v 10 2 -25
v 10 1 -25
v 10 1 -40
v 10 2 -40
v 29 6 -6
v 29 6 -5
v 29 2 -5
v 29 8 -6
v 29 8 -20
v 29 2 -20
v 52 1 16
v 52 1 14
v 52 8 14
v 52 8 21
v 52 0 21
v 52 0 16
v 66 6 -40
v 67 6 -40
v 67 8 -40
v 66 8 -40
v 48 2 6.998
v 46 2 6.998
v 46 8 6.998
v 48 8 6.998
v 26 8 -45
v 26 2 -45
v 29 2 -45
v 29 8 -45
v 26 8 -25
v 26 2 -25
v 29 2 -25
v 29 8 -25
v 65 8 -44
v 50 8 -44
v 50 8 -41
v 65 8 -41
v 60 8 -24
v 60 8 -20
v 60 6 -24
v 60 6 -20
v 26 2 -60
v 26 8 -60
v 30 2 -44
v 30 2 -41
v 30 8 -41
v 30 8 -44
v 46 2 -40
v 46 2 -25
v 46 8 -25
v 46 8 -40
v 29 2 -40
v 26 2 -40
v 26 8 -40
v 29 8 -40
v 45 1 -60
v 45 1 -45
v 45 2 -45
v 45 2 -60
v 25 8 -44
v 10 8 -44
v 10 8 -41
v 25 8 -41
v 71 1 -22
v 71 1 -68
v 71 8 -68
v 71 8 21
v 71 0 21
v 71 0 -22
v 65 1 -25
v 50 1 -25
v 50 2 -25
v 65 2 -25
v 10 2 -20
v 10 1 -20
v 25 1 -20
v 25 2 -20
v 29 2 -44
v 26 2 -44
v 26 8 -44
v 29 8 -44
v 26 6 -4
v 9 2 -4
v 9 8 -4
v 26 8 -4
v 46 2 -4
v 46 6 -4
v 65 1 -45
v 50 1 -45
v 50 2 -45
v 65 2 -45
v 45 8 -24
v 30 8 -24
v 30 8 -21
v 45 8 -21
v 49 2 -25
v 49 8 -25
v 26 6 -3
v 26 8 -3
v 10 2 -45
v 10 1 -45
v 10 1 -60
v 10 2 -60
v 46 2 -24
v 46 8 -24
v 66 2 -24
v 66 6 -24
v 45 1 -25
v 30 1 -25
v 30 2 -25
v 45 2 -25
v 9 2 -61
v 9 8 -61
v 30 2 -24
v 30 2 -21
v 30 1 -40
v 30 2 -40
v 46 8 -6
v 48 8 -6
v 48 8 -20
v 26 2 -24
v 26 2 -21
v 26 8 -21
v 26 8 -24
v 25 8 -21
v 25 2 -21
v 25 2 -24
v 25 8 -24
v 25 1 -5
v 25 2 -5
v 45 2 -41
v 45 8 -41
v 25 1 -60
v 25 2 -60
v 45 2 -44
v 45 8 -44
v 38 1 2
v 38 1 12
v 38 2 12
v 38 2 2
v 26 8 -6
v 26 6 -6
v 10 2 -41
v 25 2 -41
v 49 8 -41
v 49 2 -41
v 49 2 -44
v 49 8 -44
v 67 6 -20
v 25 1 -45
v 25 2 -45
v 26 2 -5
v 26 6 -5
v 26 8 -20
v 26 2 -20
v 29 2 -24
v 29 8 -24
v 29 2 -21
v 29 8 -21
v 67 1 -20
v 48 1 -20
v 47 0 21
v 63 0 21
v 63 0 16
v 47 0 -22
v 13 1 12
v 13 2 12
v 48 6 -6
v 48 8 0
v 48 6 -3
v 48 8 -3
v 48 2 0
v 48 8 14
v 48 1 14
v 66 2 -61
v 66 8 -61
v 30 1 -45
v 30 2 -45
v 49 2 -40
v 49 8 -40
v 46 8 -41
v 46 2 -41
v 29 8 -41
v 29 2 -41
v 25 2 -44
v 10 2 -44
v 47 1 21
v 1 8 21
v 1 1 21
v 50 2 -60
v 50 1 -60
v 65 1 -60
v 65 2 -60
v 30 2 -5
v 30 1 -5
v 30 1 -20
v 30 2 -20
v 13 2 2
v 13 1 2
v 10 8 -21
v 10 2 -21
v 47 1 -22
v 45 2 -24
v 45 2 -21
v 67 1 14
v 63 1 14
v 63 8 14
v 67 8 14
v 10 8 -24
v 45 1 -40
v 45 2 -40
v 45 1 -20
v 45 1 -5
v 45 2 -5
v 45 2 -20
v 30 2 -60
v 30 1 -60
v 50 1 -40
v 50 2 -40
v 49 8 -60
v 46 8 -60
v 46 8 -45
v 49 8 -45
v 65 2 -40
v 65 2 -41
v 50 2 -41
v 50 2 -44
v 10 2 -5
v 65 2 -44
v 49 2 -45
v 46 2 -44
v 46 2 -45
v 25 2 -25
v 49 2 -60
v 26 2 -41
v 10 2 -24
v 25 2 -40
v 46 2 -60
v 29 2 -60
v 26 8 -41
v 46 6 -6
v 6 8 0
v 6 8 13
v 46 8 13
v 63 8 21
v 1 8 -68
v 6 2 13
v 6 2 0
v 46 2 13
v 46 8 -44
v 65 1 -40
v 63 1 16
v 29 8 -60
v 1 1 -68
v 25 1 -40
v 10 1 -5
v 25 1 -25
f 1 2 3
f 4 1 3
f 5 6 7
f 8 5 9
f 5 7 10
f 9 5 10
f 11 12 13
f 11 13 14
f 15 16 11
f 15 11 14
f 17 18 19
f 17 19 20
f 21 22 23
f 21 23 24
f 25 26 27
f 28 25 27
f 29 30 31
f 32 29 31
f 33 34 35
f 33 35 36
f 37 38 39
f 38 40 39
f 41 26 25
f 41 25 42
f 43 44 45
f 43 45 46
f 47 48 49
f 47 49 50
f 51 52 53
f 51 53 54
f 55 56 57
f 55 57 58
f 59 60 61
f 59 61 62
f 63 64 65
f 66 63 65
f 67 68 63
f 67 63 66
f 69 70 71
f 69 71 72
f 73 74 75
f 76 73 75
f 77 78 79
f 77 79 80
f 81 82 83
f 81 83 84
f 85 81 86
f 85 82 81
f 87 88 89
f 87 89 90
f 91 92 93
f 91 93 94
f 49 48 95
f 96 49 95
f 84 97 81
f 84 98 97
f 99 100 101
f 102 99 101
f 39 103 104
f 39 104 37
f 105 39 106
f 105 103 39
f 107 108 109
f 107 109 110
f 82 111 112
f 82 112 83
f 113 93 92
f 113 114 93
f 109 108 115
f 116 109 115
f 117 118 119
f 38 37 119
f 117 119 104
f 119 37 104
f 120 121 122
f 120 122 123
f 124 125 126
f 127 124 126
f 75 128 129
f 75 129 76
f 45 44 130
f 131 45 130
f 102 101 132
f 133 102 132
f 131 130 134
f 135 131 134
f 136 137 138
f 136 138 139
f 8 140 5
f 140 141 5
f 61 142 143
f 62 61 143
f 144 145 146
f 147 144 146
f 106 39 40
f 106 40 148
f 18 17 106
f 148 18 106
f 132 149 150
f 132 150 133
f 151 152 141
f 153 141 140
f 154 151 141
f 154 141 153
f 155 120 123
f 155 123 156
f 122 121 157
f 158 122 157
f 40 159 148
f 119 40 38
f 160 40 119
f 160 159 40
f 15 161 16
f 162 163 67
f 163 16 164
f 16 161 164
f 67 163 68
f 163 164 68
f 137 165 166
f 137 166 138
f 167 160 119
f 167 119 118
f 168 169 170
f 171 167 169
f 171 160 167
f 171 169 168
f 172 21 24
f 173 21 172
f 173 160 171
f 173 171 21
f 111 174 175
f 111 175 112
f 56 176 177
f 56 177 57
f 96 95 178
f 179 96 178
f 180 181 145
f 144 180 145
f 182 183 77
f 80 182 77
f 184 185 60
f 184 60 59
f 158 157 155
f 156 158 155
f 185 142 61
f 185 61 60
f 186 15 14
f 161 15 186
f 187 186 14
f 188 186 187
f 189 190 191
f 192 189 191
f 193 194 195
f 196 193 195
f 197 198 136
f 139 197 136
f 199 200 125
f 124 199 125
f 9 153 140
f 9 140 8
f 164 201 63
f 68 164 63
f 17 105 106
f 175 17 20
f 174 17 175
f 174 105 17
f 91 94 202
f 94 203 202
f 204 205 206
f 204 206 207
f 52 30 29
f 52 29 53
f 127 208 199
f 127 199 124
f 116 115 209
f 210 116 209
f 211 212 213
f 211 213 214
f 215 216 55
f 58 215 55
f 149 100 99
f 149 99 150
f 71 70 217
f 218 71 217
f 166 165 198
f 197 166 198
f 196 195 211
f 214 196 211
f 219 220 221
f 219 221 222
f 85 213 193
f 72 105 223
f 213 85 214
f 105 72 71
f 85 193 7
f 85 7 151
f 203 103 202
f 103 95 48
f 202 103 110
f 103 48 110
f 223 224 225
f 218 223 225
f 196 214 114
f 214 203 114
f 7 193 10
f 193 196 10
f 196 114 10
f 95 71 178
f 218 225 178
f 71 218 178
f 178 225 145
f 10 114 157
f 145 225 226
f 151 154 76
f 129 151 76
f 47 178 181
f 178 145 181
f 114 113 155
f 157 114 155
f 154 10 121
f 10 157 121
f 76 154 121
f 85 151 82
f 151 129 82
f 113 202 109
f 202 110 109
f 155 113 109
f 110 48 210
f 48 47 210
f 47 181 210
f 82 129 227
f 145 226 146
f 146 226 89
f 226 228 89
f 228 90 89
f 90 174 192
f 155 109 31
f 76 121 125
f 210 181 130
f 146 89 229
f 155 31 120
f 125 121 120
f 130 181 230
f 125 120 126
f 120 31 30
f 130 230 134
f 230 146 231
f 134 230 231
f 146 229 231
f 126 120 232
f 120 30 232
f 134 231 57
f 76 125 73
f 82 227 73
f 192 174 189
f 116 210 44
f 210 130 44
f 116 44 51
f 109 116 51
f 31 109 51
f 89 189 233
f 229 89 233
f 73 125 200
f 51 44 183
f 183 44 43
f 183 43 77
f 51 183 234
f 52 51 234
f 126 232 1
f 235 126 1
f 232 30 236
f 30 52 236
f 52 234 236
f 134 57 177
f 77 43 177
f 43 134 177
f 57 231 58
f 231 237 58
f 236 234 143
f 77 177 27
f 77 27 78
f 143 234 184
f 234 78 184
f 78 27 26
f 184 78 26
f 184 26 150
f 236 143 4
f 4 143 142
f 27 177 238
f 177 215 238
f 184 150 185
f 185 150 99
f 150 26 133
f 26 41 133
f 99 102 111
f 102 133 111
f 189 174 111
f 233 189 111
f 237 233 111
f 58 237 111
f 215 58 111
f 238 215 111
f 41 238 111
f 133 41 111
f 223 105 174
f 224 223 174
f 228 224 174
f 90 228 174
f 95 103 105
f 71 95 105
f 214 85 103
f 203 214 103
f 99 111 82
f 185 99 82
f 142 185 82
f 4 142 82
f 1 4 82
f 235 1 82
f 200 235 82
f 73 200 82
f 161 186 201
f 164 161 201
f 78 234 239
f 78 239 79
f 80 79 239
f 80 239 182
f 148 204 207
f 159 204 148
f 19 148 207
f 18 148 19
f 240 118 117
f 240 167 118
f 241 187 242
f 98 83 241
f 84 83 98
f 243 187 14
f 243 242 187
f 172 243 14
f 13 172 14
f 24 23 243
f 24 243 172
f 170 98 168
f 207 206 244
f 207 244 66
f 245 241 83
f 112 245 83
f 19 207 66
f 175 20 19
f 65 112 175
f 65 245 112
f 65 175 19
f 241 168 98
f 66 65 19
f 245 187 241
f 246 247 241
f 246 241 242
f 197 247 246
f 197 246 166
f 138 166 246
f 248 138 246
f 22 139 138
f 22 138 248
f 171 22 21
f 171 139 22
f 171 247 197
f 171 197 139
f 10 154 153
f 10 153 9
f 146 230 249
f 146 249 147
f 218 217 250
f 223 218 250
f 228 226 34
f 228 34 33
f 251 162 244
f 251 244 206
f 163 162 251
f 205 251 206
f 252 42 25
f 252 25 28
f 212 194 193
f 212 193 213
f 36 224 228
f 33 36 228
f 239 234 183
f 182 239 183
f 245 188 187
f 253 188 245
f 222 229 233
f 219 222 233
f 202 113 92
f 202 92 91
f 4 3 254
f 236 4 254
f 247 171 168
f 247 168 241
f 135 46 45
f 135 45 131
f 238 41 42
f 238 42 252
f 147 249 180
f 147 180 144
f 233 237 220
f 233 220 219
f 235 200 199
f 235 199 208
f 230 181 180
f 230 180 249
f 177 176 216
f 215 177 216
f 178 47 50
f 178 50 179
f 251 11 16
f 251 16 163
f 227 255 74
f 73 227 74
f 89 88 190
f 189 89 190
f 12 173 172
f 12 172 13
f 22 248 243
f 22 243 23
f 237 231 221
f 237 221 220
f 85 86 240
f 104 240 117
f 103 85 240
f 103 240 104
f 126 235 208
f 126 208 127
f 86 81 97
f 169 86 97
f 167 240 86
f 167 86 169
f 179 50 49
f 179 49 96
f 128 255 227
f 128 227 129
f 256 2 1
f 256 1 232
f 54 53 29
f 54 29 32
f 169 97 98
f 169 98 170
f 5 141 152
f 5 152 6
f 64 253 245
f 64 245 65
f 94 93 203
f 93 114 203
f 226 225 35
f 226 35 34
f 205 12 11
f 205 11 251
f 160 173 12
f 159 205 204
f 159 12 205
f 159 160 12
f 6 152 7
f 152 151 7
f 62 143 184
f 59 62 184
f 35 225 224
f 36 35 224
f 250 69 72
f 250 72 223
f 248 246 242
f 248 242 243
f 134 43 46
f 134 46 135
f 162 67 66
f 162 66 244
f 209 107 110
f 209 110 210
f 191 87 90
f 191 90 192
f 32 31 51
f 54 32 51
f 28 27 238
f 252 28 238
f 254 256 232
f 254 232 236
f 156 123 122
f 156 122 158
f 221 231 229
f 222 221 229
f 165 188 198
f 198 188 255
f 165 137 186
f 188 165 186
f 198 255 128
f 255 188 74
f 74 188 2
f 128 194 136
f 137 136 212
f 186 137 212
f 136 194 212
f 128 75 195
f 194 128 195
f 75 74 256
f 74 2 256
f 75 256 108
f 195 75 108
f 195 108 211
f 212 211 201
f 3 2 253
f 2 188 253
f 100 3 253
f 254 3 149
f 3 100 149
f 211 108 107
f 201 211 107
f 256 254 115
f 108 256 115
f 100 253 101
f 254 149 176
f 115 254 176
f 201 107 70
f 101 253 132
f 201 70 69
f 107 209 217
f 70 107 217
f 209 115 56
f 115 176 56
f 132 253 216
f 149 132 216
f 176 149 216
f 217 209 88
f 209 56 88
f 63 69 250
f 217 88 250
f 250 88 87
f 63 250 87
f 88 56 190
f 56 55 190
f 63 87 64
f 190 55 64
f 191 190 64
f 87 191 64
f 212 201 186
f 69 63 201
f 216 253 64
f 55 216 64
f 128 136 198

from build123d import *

# Parameters (mm, degrees)
SKETCH_1_W                = 71
SKETCH_1_H                = 67
EXTRUDE_2_DEPTH           = 5
SKETCH_1_2_W              = 71
SKETCH_1_2_H              = 67
EXTRUDE_3_DEPTH           = 7
SKETCH_9_W                = 20
SKETCH_9_H                = 20
CUT_EXTRUDE_5_DEPTH       = 36
SKETCH_10_W               = 15
SKETCH_10_H               = 15
SKETCH_10_W_2             = 1
SKETCH_10_H_2             = 20
CUT_EXTRUDE_6_DEPTH       = 32
SKETCH_14_W               = 1
SKETCH_14_H               = 37
SKETCH_14_H_2             = 57
CUT_EXTRUDE_7_DEPTH       = 19
SKETCH_15_W               = 37
SKETCH_15_H               = 1
SKETCH_15_W_2             = 57
CUT_EXTRUDE_8_DEPTH       = 27
SKETCH_16_W               = 23
SKETCH_16_H               = 21
CUT_EXTRUDE_9_DEPTH       = 17
SKETCH_17_W               = 1
SKETCH_17_H               = 67
CUT_EXTRUDE_10_DEPTH      = 27
SKETCH_18_W               = 1
SKETCH_18_H               = 19
CUT_EXTRUDE_11_DEPTH      = 1
SKETCH_19_W               = 2
SKETCH_19_H               = 19
CUT_EXTRUDE_12_DEPTH      = 1
SKETCH_20_W               = 1
SKETCH_20_H               = 3
CUT_EXTRUDE_13_DEPTH      = 1
SKETCH_21_W               = 2
SKETCH_21_H               = 1
CUT_EXTRUDE_15_DEPTH      = 1
SKETCH_22_W               = 23
SKETCH_22_H               = 1
EXTRUDE_4_DEPTH           = 7
SKETCH_23_W               = 1
SKETCH_23_H               = 1
SKETCH_23_W_2             = 2
CUT_EXTRUDE_16_DEPTH      = 1
SKETCH_24_W               = 70
SKETCH_24_H               = 1
EXTRUDE_5_DEPTH           = 7
SKETCH_27_W               = 5
SKETCH_27_H               = 20
EXTRUDE_6_DEPTH           = 7
SKETCH_28_W               = 42
SKETCH_28_H               = 8
EXTRUDE_7_DEPTH           = 7
SKETCH_29_W               = 42
SKETCH_29_H               = 1
CUT_EXTRUDE_17_DEPTH      = 7
SKETCH_30_W               = 47
SKETCH_30_H               = 1
EXTRUDE_8_DEPTH           = 7
SKETCH_31_W               = 2
SKETCH_31_H               = 3
EXTRUDE_9_DEPTH           = 7
SKETCH_32_W               = 4
SKETCH_32_H               = 41
EXTRUDE_11_DEPTH          = 7
SKETCH_33_W               = 4
SKETCH_33_H               = 4
EXTRUDE_12_DEPTH          = 7
SKETCH_34_W               = 4
SKETCH_34_H               = 4
EXTRUDE_13_DEPTH          = 7
SKETCH_35_W               = 19
SKETCH_35_H               = 3
EXTRUDE_14_DEPTH          = 7
SKETCH_36_W               = 11
SKETCH_36_H               = 3
CUT_EXTRUDE_20_DEPTH      = 7
SKETCH_37_R               = 0.5
CUT_EXTRUDE_22_DEPTH      = 9
SKETCH_38_R               = 1
CUT_EXTRUDE_23_DEPTH      = 5
EXTRUDE_15_DEPTH          = 1
SKETCH_37_3_R             = 0.5
CUT_EXTRUDE_26_DEPTH      = 12
CUT_EXTRUDE_26_DEPTH_BACK = 12
SKETCH_40_W               = 2
SKETCH_40_H               = 1
CUT_EXTRUDE_28_DEPTH      = 9
CUT_EXTRUDE_28_DEPTH_BACK = 1
SKETCH_42_W               = 3
SKETCH_42_H               = 4
CUT_EXTRUDE_29_DEPTH      = 1
SKETCH_43_W               = 3
SKETCH_43_H               = 15
SKETCH_43_W_2             = 15
SKETCH_43_H_2             = 3
EXTRUDE_17_DEPTH          = 1
SKETCH_44_W               = 2
SKETCH_44_H               = 3.001760435
EXTRUDE_18_DEPTH          = 8
SKETCH_45_W               = 7
SKETCH_45_H               = 13
EXTRUDE_19_DEPTH          = 1
SKETCH_46_W               = 10
SKETCH_46_H               = 13
EXTRUDE_20_DEPTH          = 1
SKETCH_49_W               = 22.379206011
SKETCH_49_H               = 34.512992384
EXTRUDE_26_DEPTH          = 1
SKETCH_50_W               = 4.314622461
SKETCH_50_H               = 5.170850193
SKETCH_50_W_2             = 4.148439206
SKETCH_50_H_2             = 6.322894144
SKETCH_50_W_3             = 5.848573563
EXTRUDE_27_DEPTH          = 8
SKETCH_51_W               = 4
SKETCH_51_H               = 18
SKETCH_51_W_2             = 1
EXTRUDE_28_DEPTH          = 1
SKETCH_52_W               = 11
SKETCH_52_H               = 2
EXTRUDE_29_DEPTH          = 1
EXTRUDE_30_DEPTH          = 1
SKETCH_55_W               = 15
SKETCH_55_H               = 15
CUT_EXTRUDE_31_DEPTH      = 1
CUT_EXTRUDE_32_DEPTH      = 1
SKETCH_57_W               = 46
SKETCH_57_H               = 23
CUT_EXTRUDE_33_DEPTH      = 1
SKETCH_58_W               = 15
SKETCH_58_H               = 3
EXTRUDE_31_DEPTH          = 1
SKETCH_59_W               = 22
SKETCH_59_H               = 1
CUT_EXTRUDE_37_DEPTH      = 2
CUT_EXTRUDE_37_DEPTH_BACK = 1
SKETCH_60_W               = 25
SKETCH_60_H               = 2
SKETCH_60_H_2             = 1
EXTRUDE_32_DEPTH          = 1
SKETCH_61_W               = 2
SKETCH_61_H               = 4
CUT_EXTRUDE_39_DEPTH      = 1
CUT_EXTRUDE_39_DEPTH_BACK = 1
SKETCH_62_W               = 3
SKETCH_62_H               = 1
CUT_EXTRUDE_40_DEPTH      = 1
CUT_EXTRUDE_40_DEPTH_BACK = 1


with BuildPart() as part:
    # 草图1 → 凸台-拉伸2 (new body)
    with BuildSketch(Plane(origin=(0, 0, 0), x_dir=(1, 0, 0), z_dir=(0, 1, 0))):
        with Locations((35.5, 33.5)):
            Rectangle(SKETCH_1_W, SKETCH_1_H)
    extrude(amount=EXTRUDE_2_DEPTH)

    # 草图1<2> → 凸台-拉伸3 (add)
    with BuildSketch(Plane(origin=(0, 0, 0), x_dir=(1, 0, 0), z_dir=(0, 1, 0))):
        with Locations((35.5, 33.5)):
            Rectangle(SKETCH_1_2_W, SKETCH_1_2_H)
    extrude(amount=EXTRUDE_3_DEPTH)

    # 草图9 → 切除-拉伸5 (cut)
    with BuildSketch(Plane(origin=(0, 0, 0), x_dir=(1, 0, 0), z_dir=(0, 1, 0))):
        with Locations((61, 10)):
            Rectangle(SKETCH_9_W, SKETCH_9_H)
    extrude(amount=CUT_EXTRUDE_5_DEPTH, mode=Mode.SUBTRACT)

    # 草图10 → 切除-拉伸6 (cut)
    with BuildSketch(Plane(origin=(0, 0, 0), x_dir=(1, 0, 0), z_dir=(0, 1, 0))):
        with Locations((17.5, 52.5)):
            Rectangle(SKETCH_10_W, SKETCH_10_H)
        with Locations((37.5, 52.5)):
            Rectangle(SKETCH_10_W, SKETCH_10_H)
        with Locations((57.5, 52.5)):
            Rectangle(SKETCH_10_W, SKETCH_10_H)
        with Locations((57.5, 32.5)):
            Rectangle(SKETCH_10_W, SKETCH_10_H)
        with Locations((37.5, 32.5)):
            Rectangle(SKETCH_10_W, SKETCH_10_H)
        with Locations((17.5, 32.5)):
            Rectangle(SKETCH_10_W, SKETCH_10_H)
        with Locations((17.5, 12.5)):
            Rectangle(SKETCH_10_W, SKETCH_10_H)
        with Locations((37.5, 12.5)):
            Rectangle(SKETCH_10_W, SKETCH_10_H)
        with Locations((50.5, 10)):
            Rectangle(SKETCH_10_W_2, SKETCH_10_H_2)
    extrude(amount=CUT_EXTRUDE_6_DEPTH, mode=Mode.SUBTRACT)

    # 草图14 → 切除-拉伸7 (cut)
    with BuildSketch(Plane(origin=(0, 1, 0), x_dir=(1, 0, 0), z_dir=(0, 1, 0))):
        with Locations((65.5, 42.5)):
            Rectangle(SKETCH_14_W, SKETCH_14_H)
        with Locations((49.5, 42.5)):
            Rectangle(SKETCH_14_W, SKETCH_14_H)
        with Locations((29.5, 32.5)):
            Rectangle(SKETCH_14_W, SKETCH_14_H_2)
        with Locations((25.5, 32.5)):
            Rectangle(SKETCH_14_W, SKETCH_14_H_2)
        with Locations((9.5, 32.5)):
            Rectangle(SKETCH_14_W, SKETCH_14_H_2)
        with Locations((45.5, 32.5)):
            Rectangle(SKETCH_14_W, SKETCH_14_H_2)
    extrude(amount=CUT_EXTRUDE_7_DEPTH, mode=Mode.SUBTRACT)

    # 草图15 → 切除-拉伸8 (cut)
    with BuildSketch(Plane(origin=(0, 1, 0), x_dir=(1, 0, 0), z_dir=(0, 1, 0))):
        with Locations((27.5, 4.5)):
            Rectangle(SKETCH_15_W, SKETCH_15_H)
        with Locations((37.5, 24.5)):
            Rectangle(SKETCH_15_W_2, SKETCH_15_H)
        with Locations((37.5, 44.5)):
            Rectangle(SKETCH_15_W_2, SKETCH_15_H)
        with Locations((27.5, 20.5)):
            Rectangle(SKETCH_15_W, SKETCH_15_H)
        with Locations((37.5, 40.5)):
            Rectangle(SKETCH_15_W_2, SKETCH_15_H)
        with Locations((37.5, 60.5)):
            Rectangle(SKETCH_15_W_2, SKETCH_15_H)
    extrude(amount=CUT_EXTRUDE_8_DEPTH, mode=Mode.SUBTRACT)

    # 草图16 → 切除-拉伸9 (cut)
    with BuildSketch(Plane(origin=(0, 0, 0), x_dir=(1, 0, 0), z_dir=(0, 1, 0))):
        with Locations((59.5, 10.5)):
            Rectangle(SKETCH_16_W, SKETCH_16_H)
    extrude(amount=CUT_EXTRUDE_9_DEPTH, mode=Mode.SUBTRACT)

    # 草图17 → 切除-拉伸10 (cut)
    with BuildSketch(Plane(origin=(0, 0, 0), x_dir=(1, 0, 0), z_dir=(0, 1, 0))):
        with Locations((0.5, 33.5)):
            Rectangle(SKETCH_17_W, SKETCH_17_H)
    extrude(amount=CUT_EXTRUDE_10_DEPTH, mode=Mode.SUBTRACT)

    # 草图18 → 切除-拉伸11 (cut)
    with BuildSketch(Plane(origin=(0, 7, 0), x_dir=(1, 0, 0), z_dir=(0, 1, 0))):
        with Locations((66.5, 30.5)):
            Rectangle(SKETCH_18_W, SKETCH_18_H)
    extrude(amount=-CUT_EXTRUDE_11_DEPTH, mode=Mode.SUBTRACT)

    # 草图19 → 切除-拉伸12 (cut)
    with BuildSketch(Plane(origin=(0, 7, 0), x_dir=(1, 0, 0), z_dir=(0, 1, 0))):
        with Locations((66, 30.5)):
            Rectangle(SKETCH_19_W, SKETCH_19_H)
    extrude(amount=-CUT_EXTRUDE_12_DEPTH, mode=Mode.SUBTRACT)

    # 草图20 → 切除-拉伸13 (cut)
    with BuildSketch(Plane(origin=(0, 7, 0), x_dir=(1, 0, 0), z_dir=(0, 1, 0))):
        with Locations((63.5, 22.5)):
            Rectangle(SKETCH_20_W, SKETCH_20_H)
    extrude(amount=-CUT_EXTRUDE_13_DEPTH, mode=Mode.SUBTRACT)

    # 草图21 → 切除-拉伸15 (cut)
    with BuildSketch(Plane(origin=(0, 7, 0), x_dir=(1, 0, 0), z_dir=(0, 1, 0))):
        with Locations((47, 5.5)):
            Rectangle(SKETCH_21_W, SKETCH_21_H)
    extrude(amount=-CUT_EXTRUDE_15_DEPTH, mode=Mode.SUBTRACT)

    # 草图22 → 凸台-拉伸4 (add)
    with BuildSketch(Plane(origin=(0, 7, 0), x_dir=(1, 0, 0), z_dir=(0, 1, 0))):
        with Locations((59.5, 20.5)):
            Rectangle(SKETCH_22_W, SKETCH_22_H)
    extrude(amount=-EXTRUDE_4_DEPTH)

    # 草图23 → 切除-拉伸16 (cut)
    with BuildSketch(Plane(origin=(0, 7, 0), x_dir=(1, 0, 0), z_dir=(0, 1, 0))):
        with Locations((63.5, 20.5)):
            Rectangle(SKETCH_23_W, SKETCH_23_H)
        with Locations((66, 20.5)):
            Rectangle(SKETCH_23_W_2, SKETCH_23_H)
    extrude(amount=-CUT_EXTRUDE_16_DEPTH, mode=Mode.SUBTRACT)

    # 草图24 → 凸台-拉伸5 (add)
    with BuildSketch(Plane(origin=(0, 7, 0), x_dir=(1, 0, 0), z_dir=(0, 1, 0))):
        with Locations((36, 67.5)):
            Rectangle(SKETCH_24_W, SKETCH_24_H)
    extrude(amount=-EXTRUDE_5_DEPTH)

    # 草图27 → 凸台-拉伸6 (add)
    with BuildSketch(Plane(origin=(0, 7, 0), x_dir=(1, 0, 0), z_dir=(0, 1, 0))):
        with Locations((3.5, -10)):
            Rectangle(SKETCH_27_W, SKETCH_27_H)
    extrude(amount=-EXTRUDE_6_DEPTH)

    # 草图28 → 凸台-拉伸7 (add)
    with BuildSketch(Plane(origin=(0, 7, 0), x_dir=(1, 0, 0), z_dir=(0, 1, 0))):
        with Locations((27, -16)):
            Rectangle(SKETCH_28_W, SKETCH_28_H)
    extrude(amount=-EXTRUDE_7_DEPTH)

    # 草图29 → 切除-拉伸17 (cut)
    with BuildSketch(Plane(origin=(0, 7, 0), x_dir=(1, 0, 0), z_dir=(0, 1, 0))):
        with Locations((27, -12.5)):
            Rectangle(SKETCH_29_W, SKETCH_29_H)
    extrude(amount=-CUT_EXTRUDE_17_DEPTH, mode=Mode.SUBTRACT)

    # 草图30 → 凸台-拉伸8 (add)
    with BuildSketch(Plane(origin=(0, 7, 0), x_dir=(1, 0, 0), z_dir=(0, 1, 0))):
        with Locations((24.5, -20.5)):
            Rectangle(SKETCH_30_W, SKETCH_30_H)
    extrude(amount=-EXTRUDE_8_DEPTH)

    # 草图31 → 凸台-拉伸9 (add)
    with BuildSketch(Plane(origin=(0, 7, 0), x_dir=(1, 0, 0), z_dir=(0, 1, 0))):
        with Locations((47, -11.5)):
            Rectangle(SKETCH_31_W, SKETCH_31_H)
    extrude(amount=-EXTRUDE_9_DEPTH)

    # 草图32 → 凸台-拉伸11 (add)
    with BuildSketch(Plane(origin=(0, 7, 0), x_dir=(1, 0, 0), z_dir=(0, 1, 0))):
        with Locations((69, -0.5)):
            Rectangle(SKETCH_32_W, SKETCH_32_H)
    extrude(amount=-EXTRUDE_11_DEPTH)

    # 草图33 → 凸台-拉伸12 (add)
    with BuildSketch(Plane(origin=(0, 7, 0), x_dir=(1, 0, 0), z_dir=(0, 1, 0))):
        with Locations((65, -19)):
            Rectangle(SKETCH_33_W, SKETCH_33_H)
    extrude(amount=-EXTRUDE_12_DEPTH)

    # 草图34 → 凸台-拉伸13 (add)
    with BuildSketch(Plane(origin=(0, 7, 0), x_dir=(1, 0, 0), z_dir=(0, 1, 0))):
        with Locations((50, -19)):
            Rectangle(SKETCH_34_W, SKETCH_34_H)
    extrude(amount=-EXTRUDE_13_DEPTH)

    # 草图35 → 凸台-拉伸14 (add)
    with BuildSketch(Plane(origin=(0, 7, 0), x_dir=(1, 0, 0), z_dir=(0, 1, 0))):
        with Locations((57.5, -15.5)):
            Rectangle(SKETCH_35_W, SKETCH_35_H)
    extrude(amount=-EXTRUDE_14_DEPTH)

    # 草图36 → 切除-拉伸20 (cut)
    with BuildSketch(Plane(origin=(0, 0, 0), x_dir=(1, 0, 0), z_dir=(0, 1, 0))):
        with Locations((57.5, -15.5)):
            Rectangle(SKETCH_36_W, SKETCH_36_H)
    extrude(amount=CUT_EXTRUDE_20_DEPTH, mode=Mode.SUBTRACT)

    # 草图37 → 切除-拉伸22 (cut)
    with BuildSketch(Plane(origin=(0, 7, 0), x_dir=(1, 0, 0), z_dir=(0, 1, 0))):
        with Locations((3, -18)):
            Circle(SKETCH_37_R)
        with Locations((69.5, -18)):
            Circle(SKETCH_37_R)
        with Locations((69.5, 64)):
            Circle(SKETCH_37_R)
        with Locations((3.5, 64)):
            Circle(SKETCH_37_R)
    extrude(amount=-CUT_EXTRUDE_22_DEPTH, mode=Mode.SUBTRACT)

    # 草图38 → 切除-拉伸23 (cut)
    with BuildSketch(Plane(origin=(0, 0, 0), x_dir=(1, 0, 0), z_dir=(0, 1, 0))):
        with Locations((69.5, -18)):
            Circle(SKETCH_38_R)
        with Locations((69.5, 64)):
            Circle(SKETCH_38_R)
        with Locations((3.5, 64)):
            Circle(SKETCH_38_R)
        with Locations((3, -18)):
            Circle(SKETCH_38_R)
    extrude(amount=CUT_EXTRUDE_23_DEPTH, mode=Mode.SUBTRACT)

    # 草图39 → 凸台-拉伸15 (add)
    with BuildSketch(Plane(origin=(0, 7, 0), x_dir=(1, 0, 0), z_dir=(0, 1, 0))):
        Polygon((1, 68), (71, 68), (71, -21), (63, -21), (63, -14), (67, -14), (67, 40), (66, 40), (66, 61), (9, 61), (9, 4), (46, 4), (46, 5), (48, 5), (48, 0), (6, 0), (6, -13), (46, -13), (46, -10), (48, -10), (48, -14), (52, -14), (52, -21), (1, -21), align=None)
    extrude(amount=EXTRUDE_15_DEPTH)

    # 草图37<3> → 切除-拉伸26 (cut, two sides)
    with BuildSketch(Plane(origin=(0, 7, 0), x_dir=(1, 0, 0), z_dir=(0, 1, 0))) as cut_extrude_26_sk:
        with Locations((3, -18)):
            Circle(SKETCH_37_3_R)
        with Locations((69.5, -18)):
            Circle(SKETCH_37_3_R)
        with Locations((69.5, 64)):
            Circle(SKETCH_37_3_R)
        with Locations((3.5, 64)):
            Circle(SKETCH_37_3_R)
    extrude(amount=CUT_EXTRUDE_26_DEPTH, mode=Mode.SUBTRACT)
    extrude(cut_extrude_26_sk.sketch, amount=-CUT_EXTRUDE_26_DEPTH_BACK, mode=Mode.SUBTRACT)

    # 草图40 → 切除-拉伸28 (cut, two sides)
    with BuildSketch(Plane(origin=(0, 7, 0), x_dir=(1, 0, 0), z_dir=(0, 1, 0))) as cut_extrude_28_sk:
        with Locations((47, 4.5)):
            Rectangle(SKETCH_40_W, SKETCH_40_H)
    extrude(amount=CUT_EXTRUDE_28_DEPTH, mode=Mode.SUBTRACT)
    extrude(cut_extrude_28_sk.sketch, amount=-CUT_EXTRUDE_28_DEPTH_BACK, mode=Mode.SUBTRACT)

    # 草图42 → 切除-拉伸29 (cut)
    with BuildSketch(Plane(origin=(0, 7, 0), x_dir=(1, 0, 0), z_dir=(0, 1, 0))):
        with Locations((63.5, 22)):
            Rectangle(SKETCH_42_W, SKETCH_42_H)
    extrude(amount=-CUT_EXTRUDE_29_DEPTH, mode=Mode.SUBTRACT)

    # 草图43 → 凸台-拉伸17 (add)
    with BuildSketch(Plane(origin=(0, 7, 0), x_dir=(1, 0, 0), z_dir=(0, 1, 0))):
        Polygon((46, 6), (46, 24), (62, 24), (62, 20), (48, 20), (48, 6), align=None)
        with Locations((47.5, 32.5)):
            Rectangle(SKETCH_43_W, SKETCH_43_H)
        with Locations((47.5, 52.5)):
            Rectangle(SKETCH_43_W, SKETCH_43_H)
        with Locations((57.5, 42.5)):
            Rectangle(SKETCH_43_W_2, SKETCH_43_H_2)
        with Locations((27.5, 52.5)):
            Rectangle(SKETCH_43_W, SKETCH_43_H)
        with Locations((27.5, 32.5)):
            Rectangle(SKETCH_43_W, SKETCH_43_H)
        with Locations((17.5, 42.5)):
            Rectangle(SKETCH_43_W_2, SKETCH_43_H_2)
        with Locations((37.5, 42.5)):
            Rectangle(SKETCH_43_W_2, SKETCH_43_H_2)
        with Locations((17.5, 22.5)):
            Rectangle(SKETCH_43_W_2, SKETCH_43_H_2)
        with Locations((27.5, 12.5)):
            Rectangle(SKETCH_43_W, SKETCH_43_H)
        with Locations((27.5, 22.5)):
            Rectangle(SKETCH_43_W, SKETCH_43_H_2)
        with Locations((47.5, 42.5)):
            Rectangle(SKETCH_43_W, SKETCH_43_H_2)
        with Locations((27.5, 42.5)):
            Rectangle(SKETCH_43_W, SKETCH_43_H_2)
    extrude(amount=EXTRUDE_17_DEPTH)

    # 草图44 → 凸台-拉伸18 (add)
    with BuildSketch(Plane(origin=(0, 0, 0), x_dir=(1, 0, 0), z_dir=(0, 1, 0))):
        with Locations((47, -8.499119782)):
            Rectangle(SKETCH_44_W, SKETCH_44_H)
    extrude(amount=EXTRUDE_18_DEPTH)

    # 草图45 → 凸台-拉伸19 (add)
    with BuildSketch(Plane(origin=(0, 1, 0), x_dir=(1, 0, 0), z_dir=(0, 1, 0))):
        with Locations((9.5, -6.5)):
            Rectangle(SKETCH_45_W, SKETCH_45_H)
    extrude(amount=EXTRUDE_19_DEPTH)

    # 草图46 → 凸台-拉伸20 (add)
    with BuildSketch(Plane(origin=(0, 1, 0), x_dir=(1, 0, 0), z_dir=(0, 1, 0))):
        with Locations((43, -6.5)):
            Rectangle(SKETCH_46_W, SKETCH_46_H)
    extrude(amount=EXTRUDE_20_DEPTH)

    # 草图49 → 凸台-拉伸26 (add)
    with BuildSketch(Plane(origin=(0, 0, 0), x_dir=(1, 0, 0), z_dir=(0, 1, 0))):
        with Locations((57.189603006, 3.256496192)):
            Rectangle(SKETCH_49_W, SKETCH_49_H)
    extrude(amount=EXTRUDE_26_DEPTH)

    # 草图50 → 凸台-拉伸27 (add)
    with BuildSketch(Plane(origin=(0, 0, 0), x_dir=(1, 0, 0), z_dir=(0, 1, 0))):
        with Locations((3.15731123, -18.414574904)):
            Rectangle(SKETCH_50_W, SKETCH_50_H)
        with Locations((68.925780397, -18.414574904)):
            Rectangle(SKETCH_50_W_2, SKETCH_50_H)
        with Locations((68.925780397, 64.838552928)):
            Rectangle(SKETCH_50_W_2, SKETCH_50_H_2)
        with Locations((3.924286782, 64.838552928)):
            Rectangle(SKETCH_50_W_3, SKETCH_50_H_2)
    extrude(amount=EXTRUDE_27_DEPTH)

    # 草图51 → 凸台-拉伸28 (add)
    with BuildSketch(Plane(origin=(0, 1, 0), x_dir=(1, 0, 0), z_dir=(0, 1, 0))):
        with Locations((8, -4)):
            Rectangle(SKETCH_51_W, SKETCH_51_H)
        with Locations((45.5, -4)):
            Rectangle(SKETCH_51_W_2, SKETCH_51_H)
    extrude(amount=-EXTRUDE_28_DEPTH)

    # 草图52 → 凸台-拉伸29 (add)
    with BuildSketch(Plane(origin=(0, 1, 0), x_dir=(1, 0, 0), z_dir=(0, 1, 0))):
        with Locations((57.5, -15)):
            Rectangle(SKETCH_52_W, SKETCH_52_H)
    extrude(amount=-EXTRUDE_29_DEPTH)

    # 草图54 → 凸台-拉伸30 (add)
    with BuildSketch(Plane(origin=(0, 1, 0), x_dir=(1, 0, 0), z_dir=(0, 1, 0))):
        Polygon((9, 61), (66, 61), (66, 24), (46, 24), (46, 4), (9, 4), align=None)
    extrude(amount=EXTRUDE_30_DEPTH)

    # 草图55 → 切除-拉伸31 (cut)
    with BuildSketch(Plane(origin=(0, 1, 0), x_dir=(1, 0, 0), z_dir=(0, 1, 0))):
        with Locations((57.5, 52.5)):
            Rectangle(SKETCH_55_W, SKETCH_55_H)
        with Locations((37.5, 52.5)):
            Rectangle(SKETCH_55_W, SKETCH_55_H)
        with Locations((17.5, 52.5)):
            Rectangle(SKETCH_55_W, SKETCH_55_H)
        with Locations((57.5, 32.5)):
            Rectangle(SKETCH_55_W, SKETCH_55_H)
        with Locations((37.5, 32.5)):
            Rectangle(SKETCH_55_W, SKETCH_55_H)
        with Locations((17.5, 32.5)):
            Rectangle(SKETCH_55_W, SKETCH_55_H)
        with Locations((37.5, 12.5)):
            Rectangle(SKETCH_55_W, SKETCH_55_H)
        with Locations((17.5, 12.5)):
            Rectangle(SKETCH_55_W, SKETCH_55_H)
    extrude(amount=CUT_EXTRUDE_31_DEPTH, mode=Mode.SUBTRACT)

    # 草图56 → 切除-拉伸32 (cut)
    with BuildSketch(Plane(origin=(0, 1, 0), x_dir=(1, 0, 0), z_dir=(0, 1, 0))):
        Polygon((1, 68), (1, 2), (47, 2), (47, 22), (71, 22), (71, 68), align=None)
    extrude(amount=-CUT_EXTRUDE_32_DEPTH, mode=Mode.SUBTRACT)

    # 草图57 → 切除-拉伸33 (cut)
    with BuildSketch(Plane(origin=(0, 1, 0), x_dir=(1, 0, 0), z_dir=(0, 1, 0))):
        with Locations((24, -9.5)):
            Rectangle(SKETCH_57_W, SKETCH_57_H)
    extrude(amount=-CUT_EXTRUDE_33_DEPTH, mode=Mode.SUBTRACT)

    # 草图58 → 凸台-拉伸31 (add)
    with BuildSketch(Plane(origin=(0, 7, 0), x_dir=(1, 0, 0), z_dir=(0, 1, 0))):
        with Locations((37.5, 22.5)):
            Rectangle(SKETCH_58_W, SKETCH_58_H)
    extrude(amount=EXTRUDE_31_DEPTH)

    # 草图59 → 切除-拉伸37 (cut, two sides)
    with BuildSketch(Plane(origin=(0, 7, 0), x_dir=(1, 0, 0), z_dir=(0, 1, 0))) as cut_extrude_37_sk:
        with Locations((37, 3.5)):
            Rectangle(SKETCH_59_W, SKETCH_59_H)
    extrude(amount=CUT_EXTRUDE_37_DEPTH, mode=Mode.SUBTRACT)
    extrude(cut_extrude_37_sk.sketch, amount=-CUT_EXTRUDE_37_DEPTH_BACK, mode=Mode.SUBTRACT)

    # 草图60 → 凸台-拉伸32 (add)
    with BuildSketch(Plane(origin=(0, 1, 0), x_dir=(1, 0, 0), z_dir=(0, 1, 0))):
        with Locations((25.5, -1)):
            Rectangle(SKETCH_60_W, SKETCH_60_H)
        with Locations((25.5, -12.5)):
            Rectangle(SKETCH_60_W, SKETCH_60_H_2)
    extrude(amount=EXTRUDE_32_DEPTH)

    # 草图61 → 切除-拉伸39 (cut, two sides)
    with BuildSketch(Plane(origin=(0, 7, 0), x_dir=(1, 0, 0), z_dir=(0, 1, 0))) as cut_extrude_39_sk:
        with Locations((61, 22)):
            Rectangle(SKETCH_61_W, SKETCH_61_H)
    extrude(amount=CUT_EXTRUDE_39_DEPTH, mode=Mode.SUBTRACT)
    extrude(cut_extrude_39_sk.sketch, amount=-CUT_EXTRUDE_39_DEPTH_BACK, mode=Mode.SUBTRACT)

    # 草图62 → 切除-拉伸40 (cut, two sides)
    with BuildSketch(Plane(origin=(0, 7, 0), x_dir=(1, 0, 0), z_dir=(0, 1, 0))) as cut_extrude_40_sk:
        with Locations((27.5, 5.5)):
            Rectangle(SKETCH_62_W, SKETCH_62_H)
    extrude(amount=CUT_EXTRUDE_40_DEPTH, mode=Mode.SUBTRACT)
    extrude(cut_extrude_40_sk.sketch, amount=-CUT_EXTRUDE_40_DEPTH_BACK, mode=Mode.SUBTRACT)


solid = part.part
